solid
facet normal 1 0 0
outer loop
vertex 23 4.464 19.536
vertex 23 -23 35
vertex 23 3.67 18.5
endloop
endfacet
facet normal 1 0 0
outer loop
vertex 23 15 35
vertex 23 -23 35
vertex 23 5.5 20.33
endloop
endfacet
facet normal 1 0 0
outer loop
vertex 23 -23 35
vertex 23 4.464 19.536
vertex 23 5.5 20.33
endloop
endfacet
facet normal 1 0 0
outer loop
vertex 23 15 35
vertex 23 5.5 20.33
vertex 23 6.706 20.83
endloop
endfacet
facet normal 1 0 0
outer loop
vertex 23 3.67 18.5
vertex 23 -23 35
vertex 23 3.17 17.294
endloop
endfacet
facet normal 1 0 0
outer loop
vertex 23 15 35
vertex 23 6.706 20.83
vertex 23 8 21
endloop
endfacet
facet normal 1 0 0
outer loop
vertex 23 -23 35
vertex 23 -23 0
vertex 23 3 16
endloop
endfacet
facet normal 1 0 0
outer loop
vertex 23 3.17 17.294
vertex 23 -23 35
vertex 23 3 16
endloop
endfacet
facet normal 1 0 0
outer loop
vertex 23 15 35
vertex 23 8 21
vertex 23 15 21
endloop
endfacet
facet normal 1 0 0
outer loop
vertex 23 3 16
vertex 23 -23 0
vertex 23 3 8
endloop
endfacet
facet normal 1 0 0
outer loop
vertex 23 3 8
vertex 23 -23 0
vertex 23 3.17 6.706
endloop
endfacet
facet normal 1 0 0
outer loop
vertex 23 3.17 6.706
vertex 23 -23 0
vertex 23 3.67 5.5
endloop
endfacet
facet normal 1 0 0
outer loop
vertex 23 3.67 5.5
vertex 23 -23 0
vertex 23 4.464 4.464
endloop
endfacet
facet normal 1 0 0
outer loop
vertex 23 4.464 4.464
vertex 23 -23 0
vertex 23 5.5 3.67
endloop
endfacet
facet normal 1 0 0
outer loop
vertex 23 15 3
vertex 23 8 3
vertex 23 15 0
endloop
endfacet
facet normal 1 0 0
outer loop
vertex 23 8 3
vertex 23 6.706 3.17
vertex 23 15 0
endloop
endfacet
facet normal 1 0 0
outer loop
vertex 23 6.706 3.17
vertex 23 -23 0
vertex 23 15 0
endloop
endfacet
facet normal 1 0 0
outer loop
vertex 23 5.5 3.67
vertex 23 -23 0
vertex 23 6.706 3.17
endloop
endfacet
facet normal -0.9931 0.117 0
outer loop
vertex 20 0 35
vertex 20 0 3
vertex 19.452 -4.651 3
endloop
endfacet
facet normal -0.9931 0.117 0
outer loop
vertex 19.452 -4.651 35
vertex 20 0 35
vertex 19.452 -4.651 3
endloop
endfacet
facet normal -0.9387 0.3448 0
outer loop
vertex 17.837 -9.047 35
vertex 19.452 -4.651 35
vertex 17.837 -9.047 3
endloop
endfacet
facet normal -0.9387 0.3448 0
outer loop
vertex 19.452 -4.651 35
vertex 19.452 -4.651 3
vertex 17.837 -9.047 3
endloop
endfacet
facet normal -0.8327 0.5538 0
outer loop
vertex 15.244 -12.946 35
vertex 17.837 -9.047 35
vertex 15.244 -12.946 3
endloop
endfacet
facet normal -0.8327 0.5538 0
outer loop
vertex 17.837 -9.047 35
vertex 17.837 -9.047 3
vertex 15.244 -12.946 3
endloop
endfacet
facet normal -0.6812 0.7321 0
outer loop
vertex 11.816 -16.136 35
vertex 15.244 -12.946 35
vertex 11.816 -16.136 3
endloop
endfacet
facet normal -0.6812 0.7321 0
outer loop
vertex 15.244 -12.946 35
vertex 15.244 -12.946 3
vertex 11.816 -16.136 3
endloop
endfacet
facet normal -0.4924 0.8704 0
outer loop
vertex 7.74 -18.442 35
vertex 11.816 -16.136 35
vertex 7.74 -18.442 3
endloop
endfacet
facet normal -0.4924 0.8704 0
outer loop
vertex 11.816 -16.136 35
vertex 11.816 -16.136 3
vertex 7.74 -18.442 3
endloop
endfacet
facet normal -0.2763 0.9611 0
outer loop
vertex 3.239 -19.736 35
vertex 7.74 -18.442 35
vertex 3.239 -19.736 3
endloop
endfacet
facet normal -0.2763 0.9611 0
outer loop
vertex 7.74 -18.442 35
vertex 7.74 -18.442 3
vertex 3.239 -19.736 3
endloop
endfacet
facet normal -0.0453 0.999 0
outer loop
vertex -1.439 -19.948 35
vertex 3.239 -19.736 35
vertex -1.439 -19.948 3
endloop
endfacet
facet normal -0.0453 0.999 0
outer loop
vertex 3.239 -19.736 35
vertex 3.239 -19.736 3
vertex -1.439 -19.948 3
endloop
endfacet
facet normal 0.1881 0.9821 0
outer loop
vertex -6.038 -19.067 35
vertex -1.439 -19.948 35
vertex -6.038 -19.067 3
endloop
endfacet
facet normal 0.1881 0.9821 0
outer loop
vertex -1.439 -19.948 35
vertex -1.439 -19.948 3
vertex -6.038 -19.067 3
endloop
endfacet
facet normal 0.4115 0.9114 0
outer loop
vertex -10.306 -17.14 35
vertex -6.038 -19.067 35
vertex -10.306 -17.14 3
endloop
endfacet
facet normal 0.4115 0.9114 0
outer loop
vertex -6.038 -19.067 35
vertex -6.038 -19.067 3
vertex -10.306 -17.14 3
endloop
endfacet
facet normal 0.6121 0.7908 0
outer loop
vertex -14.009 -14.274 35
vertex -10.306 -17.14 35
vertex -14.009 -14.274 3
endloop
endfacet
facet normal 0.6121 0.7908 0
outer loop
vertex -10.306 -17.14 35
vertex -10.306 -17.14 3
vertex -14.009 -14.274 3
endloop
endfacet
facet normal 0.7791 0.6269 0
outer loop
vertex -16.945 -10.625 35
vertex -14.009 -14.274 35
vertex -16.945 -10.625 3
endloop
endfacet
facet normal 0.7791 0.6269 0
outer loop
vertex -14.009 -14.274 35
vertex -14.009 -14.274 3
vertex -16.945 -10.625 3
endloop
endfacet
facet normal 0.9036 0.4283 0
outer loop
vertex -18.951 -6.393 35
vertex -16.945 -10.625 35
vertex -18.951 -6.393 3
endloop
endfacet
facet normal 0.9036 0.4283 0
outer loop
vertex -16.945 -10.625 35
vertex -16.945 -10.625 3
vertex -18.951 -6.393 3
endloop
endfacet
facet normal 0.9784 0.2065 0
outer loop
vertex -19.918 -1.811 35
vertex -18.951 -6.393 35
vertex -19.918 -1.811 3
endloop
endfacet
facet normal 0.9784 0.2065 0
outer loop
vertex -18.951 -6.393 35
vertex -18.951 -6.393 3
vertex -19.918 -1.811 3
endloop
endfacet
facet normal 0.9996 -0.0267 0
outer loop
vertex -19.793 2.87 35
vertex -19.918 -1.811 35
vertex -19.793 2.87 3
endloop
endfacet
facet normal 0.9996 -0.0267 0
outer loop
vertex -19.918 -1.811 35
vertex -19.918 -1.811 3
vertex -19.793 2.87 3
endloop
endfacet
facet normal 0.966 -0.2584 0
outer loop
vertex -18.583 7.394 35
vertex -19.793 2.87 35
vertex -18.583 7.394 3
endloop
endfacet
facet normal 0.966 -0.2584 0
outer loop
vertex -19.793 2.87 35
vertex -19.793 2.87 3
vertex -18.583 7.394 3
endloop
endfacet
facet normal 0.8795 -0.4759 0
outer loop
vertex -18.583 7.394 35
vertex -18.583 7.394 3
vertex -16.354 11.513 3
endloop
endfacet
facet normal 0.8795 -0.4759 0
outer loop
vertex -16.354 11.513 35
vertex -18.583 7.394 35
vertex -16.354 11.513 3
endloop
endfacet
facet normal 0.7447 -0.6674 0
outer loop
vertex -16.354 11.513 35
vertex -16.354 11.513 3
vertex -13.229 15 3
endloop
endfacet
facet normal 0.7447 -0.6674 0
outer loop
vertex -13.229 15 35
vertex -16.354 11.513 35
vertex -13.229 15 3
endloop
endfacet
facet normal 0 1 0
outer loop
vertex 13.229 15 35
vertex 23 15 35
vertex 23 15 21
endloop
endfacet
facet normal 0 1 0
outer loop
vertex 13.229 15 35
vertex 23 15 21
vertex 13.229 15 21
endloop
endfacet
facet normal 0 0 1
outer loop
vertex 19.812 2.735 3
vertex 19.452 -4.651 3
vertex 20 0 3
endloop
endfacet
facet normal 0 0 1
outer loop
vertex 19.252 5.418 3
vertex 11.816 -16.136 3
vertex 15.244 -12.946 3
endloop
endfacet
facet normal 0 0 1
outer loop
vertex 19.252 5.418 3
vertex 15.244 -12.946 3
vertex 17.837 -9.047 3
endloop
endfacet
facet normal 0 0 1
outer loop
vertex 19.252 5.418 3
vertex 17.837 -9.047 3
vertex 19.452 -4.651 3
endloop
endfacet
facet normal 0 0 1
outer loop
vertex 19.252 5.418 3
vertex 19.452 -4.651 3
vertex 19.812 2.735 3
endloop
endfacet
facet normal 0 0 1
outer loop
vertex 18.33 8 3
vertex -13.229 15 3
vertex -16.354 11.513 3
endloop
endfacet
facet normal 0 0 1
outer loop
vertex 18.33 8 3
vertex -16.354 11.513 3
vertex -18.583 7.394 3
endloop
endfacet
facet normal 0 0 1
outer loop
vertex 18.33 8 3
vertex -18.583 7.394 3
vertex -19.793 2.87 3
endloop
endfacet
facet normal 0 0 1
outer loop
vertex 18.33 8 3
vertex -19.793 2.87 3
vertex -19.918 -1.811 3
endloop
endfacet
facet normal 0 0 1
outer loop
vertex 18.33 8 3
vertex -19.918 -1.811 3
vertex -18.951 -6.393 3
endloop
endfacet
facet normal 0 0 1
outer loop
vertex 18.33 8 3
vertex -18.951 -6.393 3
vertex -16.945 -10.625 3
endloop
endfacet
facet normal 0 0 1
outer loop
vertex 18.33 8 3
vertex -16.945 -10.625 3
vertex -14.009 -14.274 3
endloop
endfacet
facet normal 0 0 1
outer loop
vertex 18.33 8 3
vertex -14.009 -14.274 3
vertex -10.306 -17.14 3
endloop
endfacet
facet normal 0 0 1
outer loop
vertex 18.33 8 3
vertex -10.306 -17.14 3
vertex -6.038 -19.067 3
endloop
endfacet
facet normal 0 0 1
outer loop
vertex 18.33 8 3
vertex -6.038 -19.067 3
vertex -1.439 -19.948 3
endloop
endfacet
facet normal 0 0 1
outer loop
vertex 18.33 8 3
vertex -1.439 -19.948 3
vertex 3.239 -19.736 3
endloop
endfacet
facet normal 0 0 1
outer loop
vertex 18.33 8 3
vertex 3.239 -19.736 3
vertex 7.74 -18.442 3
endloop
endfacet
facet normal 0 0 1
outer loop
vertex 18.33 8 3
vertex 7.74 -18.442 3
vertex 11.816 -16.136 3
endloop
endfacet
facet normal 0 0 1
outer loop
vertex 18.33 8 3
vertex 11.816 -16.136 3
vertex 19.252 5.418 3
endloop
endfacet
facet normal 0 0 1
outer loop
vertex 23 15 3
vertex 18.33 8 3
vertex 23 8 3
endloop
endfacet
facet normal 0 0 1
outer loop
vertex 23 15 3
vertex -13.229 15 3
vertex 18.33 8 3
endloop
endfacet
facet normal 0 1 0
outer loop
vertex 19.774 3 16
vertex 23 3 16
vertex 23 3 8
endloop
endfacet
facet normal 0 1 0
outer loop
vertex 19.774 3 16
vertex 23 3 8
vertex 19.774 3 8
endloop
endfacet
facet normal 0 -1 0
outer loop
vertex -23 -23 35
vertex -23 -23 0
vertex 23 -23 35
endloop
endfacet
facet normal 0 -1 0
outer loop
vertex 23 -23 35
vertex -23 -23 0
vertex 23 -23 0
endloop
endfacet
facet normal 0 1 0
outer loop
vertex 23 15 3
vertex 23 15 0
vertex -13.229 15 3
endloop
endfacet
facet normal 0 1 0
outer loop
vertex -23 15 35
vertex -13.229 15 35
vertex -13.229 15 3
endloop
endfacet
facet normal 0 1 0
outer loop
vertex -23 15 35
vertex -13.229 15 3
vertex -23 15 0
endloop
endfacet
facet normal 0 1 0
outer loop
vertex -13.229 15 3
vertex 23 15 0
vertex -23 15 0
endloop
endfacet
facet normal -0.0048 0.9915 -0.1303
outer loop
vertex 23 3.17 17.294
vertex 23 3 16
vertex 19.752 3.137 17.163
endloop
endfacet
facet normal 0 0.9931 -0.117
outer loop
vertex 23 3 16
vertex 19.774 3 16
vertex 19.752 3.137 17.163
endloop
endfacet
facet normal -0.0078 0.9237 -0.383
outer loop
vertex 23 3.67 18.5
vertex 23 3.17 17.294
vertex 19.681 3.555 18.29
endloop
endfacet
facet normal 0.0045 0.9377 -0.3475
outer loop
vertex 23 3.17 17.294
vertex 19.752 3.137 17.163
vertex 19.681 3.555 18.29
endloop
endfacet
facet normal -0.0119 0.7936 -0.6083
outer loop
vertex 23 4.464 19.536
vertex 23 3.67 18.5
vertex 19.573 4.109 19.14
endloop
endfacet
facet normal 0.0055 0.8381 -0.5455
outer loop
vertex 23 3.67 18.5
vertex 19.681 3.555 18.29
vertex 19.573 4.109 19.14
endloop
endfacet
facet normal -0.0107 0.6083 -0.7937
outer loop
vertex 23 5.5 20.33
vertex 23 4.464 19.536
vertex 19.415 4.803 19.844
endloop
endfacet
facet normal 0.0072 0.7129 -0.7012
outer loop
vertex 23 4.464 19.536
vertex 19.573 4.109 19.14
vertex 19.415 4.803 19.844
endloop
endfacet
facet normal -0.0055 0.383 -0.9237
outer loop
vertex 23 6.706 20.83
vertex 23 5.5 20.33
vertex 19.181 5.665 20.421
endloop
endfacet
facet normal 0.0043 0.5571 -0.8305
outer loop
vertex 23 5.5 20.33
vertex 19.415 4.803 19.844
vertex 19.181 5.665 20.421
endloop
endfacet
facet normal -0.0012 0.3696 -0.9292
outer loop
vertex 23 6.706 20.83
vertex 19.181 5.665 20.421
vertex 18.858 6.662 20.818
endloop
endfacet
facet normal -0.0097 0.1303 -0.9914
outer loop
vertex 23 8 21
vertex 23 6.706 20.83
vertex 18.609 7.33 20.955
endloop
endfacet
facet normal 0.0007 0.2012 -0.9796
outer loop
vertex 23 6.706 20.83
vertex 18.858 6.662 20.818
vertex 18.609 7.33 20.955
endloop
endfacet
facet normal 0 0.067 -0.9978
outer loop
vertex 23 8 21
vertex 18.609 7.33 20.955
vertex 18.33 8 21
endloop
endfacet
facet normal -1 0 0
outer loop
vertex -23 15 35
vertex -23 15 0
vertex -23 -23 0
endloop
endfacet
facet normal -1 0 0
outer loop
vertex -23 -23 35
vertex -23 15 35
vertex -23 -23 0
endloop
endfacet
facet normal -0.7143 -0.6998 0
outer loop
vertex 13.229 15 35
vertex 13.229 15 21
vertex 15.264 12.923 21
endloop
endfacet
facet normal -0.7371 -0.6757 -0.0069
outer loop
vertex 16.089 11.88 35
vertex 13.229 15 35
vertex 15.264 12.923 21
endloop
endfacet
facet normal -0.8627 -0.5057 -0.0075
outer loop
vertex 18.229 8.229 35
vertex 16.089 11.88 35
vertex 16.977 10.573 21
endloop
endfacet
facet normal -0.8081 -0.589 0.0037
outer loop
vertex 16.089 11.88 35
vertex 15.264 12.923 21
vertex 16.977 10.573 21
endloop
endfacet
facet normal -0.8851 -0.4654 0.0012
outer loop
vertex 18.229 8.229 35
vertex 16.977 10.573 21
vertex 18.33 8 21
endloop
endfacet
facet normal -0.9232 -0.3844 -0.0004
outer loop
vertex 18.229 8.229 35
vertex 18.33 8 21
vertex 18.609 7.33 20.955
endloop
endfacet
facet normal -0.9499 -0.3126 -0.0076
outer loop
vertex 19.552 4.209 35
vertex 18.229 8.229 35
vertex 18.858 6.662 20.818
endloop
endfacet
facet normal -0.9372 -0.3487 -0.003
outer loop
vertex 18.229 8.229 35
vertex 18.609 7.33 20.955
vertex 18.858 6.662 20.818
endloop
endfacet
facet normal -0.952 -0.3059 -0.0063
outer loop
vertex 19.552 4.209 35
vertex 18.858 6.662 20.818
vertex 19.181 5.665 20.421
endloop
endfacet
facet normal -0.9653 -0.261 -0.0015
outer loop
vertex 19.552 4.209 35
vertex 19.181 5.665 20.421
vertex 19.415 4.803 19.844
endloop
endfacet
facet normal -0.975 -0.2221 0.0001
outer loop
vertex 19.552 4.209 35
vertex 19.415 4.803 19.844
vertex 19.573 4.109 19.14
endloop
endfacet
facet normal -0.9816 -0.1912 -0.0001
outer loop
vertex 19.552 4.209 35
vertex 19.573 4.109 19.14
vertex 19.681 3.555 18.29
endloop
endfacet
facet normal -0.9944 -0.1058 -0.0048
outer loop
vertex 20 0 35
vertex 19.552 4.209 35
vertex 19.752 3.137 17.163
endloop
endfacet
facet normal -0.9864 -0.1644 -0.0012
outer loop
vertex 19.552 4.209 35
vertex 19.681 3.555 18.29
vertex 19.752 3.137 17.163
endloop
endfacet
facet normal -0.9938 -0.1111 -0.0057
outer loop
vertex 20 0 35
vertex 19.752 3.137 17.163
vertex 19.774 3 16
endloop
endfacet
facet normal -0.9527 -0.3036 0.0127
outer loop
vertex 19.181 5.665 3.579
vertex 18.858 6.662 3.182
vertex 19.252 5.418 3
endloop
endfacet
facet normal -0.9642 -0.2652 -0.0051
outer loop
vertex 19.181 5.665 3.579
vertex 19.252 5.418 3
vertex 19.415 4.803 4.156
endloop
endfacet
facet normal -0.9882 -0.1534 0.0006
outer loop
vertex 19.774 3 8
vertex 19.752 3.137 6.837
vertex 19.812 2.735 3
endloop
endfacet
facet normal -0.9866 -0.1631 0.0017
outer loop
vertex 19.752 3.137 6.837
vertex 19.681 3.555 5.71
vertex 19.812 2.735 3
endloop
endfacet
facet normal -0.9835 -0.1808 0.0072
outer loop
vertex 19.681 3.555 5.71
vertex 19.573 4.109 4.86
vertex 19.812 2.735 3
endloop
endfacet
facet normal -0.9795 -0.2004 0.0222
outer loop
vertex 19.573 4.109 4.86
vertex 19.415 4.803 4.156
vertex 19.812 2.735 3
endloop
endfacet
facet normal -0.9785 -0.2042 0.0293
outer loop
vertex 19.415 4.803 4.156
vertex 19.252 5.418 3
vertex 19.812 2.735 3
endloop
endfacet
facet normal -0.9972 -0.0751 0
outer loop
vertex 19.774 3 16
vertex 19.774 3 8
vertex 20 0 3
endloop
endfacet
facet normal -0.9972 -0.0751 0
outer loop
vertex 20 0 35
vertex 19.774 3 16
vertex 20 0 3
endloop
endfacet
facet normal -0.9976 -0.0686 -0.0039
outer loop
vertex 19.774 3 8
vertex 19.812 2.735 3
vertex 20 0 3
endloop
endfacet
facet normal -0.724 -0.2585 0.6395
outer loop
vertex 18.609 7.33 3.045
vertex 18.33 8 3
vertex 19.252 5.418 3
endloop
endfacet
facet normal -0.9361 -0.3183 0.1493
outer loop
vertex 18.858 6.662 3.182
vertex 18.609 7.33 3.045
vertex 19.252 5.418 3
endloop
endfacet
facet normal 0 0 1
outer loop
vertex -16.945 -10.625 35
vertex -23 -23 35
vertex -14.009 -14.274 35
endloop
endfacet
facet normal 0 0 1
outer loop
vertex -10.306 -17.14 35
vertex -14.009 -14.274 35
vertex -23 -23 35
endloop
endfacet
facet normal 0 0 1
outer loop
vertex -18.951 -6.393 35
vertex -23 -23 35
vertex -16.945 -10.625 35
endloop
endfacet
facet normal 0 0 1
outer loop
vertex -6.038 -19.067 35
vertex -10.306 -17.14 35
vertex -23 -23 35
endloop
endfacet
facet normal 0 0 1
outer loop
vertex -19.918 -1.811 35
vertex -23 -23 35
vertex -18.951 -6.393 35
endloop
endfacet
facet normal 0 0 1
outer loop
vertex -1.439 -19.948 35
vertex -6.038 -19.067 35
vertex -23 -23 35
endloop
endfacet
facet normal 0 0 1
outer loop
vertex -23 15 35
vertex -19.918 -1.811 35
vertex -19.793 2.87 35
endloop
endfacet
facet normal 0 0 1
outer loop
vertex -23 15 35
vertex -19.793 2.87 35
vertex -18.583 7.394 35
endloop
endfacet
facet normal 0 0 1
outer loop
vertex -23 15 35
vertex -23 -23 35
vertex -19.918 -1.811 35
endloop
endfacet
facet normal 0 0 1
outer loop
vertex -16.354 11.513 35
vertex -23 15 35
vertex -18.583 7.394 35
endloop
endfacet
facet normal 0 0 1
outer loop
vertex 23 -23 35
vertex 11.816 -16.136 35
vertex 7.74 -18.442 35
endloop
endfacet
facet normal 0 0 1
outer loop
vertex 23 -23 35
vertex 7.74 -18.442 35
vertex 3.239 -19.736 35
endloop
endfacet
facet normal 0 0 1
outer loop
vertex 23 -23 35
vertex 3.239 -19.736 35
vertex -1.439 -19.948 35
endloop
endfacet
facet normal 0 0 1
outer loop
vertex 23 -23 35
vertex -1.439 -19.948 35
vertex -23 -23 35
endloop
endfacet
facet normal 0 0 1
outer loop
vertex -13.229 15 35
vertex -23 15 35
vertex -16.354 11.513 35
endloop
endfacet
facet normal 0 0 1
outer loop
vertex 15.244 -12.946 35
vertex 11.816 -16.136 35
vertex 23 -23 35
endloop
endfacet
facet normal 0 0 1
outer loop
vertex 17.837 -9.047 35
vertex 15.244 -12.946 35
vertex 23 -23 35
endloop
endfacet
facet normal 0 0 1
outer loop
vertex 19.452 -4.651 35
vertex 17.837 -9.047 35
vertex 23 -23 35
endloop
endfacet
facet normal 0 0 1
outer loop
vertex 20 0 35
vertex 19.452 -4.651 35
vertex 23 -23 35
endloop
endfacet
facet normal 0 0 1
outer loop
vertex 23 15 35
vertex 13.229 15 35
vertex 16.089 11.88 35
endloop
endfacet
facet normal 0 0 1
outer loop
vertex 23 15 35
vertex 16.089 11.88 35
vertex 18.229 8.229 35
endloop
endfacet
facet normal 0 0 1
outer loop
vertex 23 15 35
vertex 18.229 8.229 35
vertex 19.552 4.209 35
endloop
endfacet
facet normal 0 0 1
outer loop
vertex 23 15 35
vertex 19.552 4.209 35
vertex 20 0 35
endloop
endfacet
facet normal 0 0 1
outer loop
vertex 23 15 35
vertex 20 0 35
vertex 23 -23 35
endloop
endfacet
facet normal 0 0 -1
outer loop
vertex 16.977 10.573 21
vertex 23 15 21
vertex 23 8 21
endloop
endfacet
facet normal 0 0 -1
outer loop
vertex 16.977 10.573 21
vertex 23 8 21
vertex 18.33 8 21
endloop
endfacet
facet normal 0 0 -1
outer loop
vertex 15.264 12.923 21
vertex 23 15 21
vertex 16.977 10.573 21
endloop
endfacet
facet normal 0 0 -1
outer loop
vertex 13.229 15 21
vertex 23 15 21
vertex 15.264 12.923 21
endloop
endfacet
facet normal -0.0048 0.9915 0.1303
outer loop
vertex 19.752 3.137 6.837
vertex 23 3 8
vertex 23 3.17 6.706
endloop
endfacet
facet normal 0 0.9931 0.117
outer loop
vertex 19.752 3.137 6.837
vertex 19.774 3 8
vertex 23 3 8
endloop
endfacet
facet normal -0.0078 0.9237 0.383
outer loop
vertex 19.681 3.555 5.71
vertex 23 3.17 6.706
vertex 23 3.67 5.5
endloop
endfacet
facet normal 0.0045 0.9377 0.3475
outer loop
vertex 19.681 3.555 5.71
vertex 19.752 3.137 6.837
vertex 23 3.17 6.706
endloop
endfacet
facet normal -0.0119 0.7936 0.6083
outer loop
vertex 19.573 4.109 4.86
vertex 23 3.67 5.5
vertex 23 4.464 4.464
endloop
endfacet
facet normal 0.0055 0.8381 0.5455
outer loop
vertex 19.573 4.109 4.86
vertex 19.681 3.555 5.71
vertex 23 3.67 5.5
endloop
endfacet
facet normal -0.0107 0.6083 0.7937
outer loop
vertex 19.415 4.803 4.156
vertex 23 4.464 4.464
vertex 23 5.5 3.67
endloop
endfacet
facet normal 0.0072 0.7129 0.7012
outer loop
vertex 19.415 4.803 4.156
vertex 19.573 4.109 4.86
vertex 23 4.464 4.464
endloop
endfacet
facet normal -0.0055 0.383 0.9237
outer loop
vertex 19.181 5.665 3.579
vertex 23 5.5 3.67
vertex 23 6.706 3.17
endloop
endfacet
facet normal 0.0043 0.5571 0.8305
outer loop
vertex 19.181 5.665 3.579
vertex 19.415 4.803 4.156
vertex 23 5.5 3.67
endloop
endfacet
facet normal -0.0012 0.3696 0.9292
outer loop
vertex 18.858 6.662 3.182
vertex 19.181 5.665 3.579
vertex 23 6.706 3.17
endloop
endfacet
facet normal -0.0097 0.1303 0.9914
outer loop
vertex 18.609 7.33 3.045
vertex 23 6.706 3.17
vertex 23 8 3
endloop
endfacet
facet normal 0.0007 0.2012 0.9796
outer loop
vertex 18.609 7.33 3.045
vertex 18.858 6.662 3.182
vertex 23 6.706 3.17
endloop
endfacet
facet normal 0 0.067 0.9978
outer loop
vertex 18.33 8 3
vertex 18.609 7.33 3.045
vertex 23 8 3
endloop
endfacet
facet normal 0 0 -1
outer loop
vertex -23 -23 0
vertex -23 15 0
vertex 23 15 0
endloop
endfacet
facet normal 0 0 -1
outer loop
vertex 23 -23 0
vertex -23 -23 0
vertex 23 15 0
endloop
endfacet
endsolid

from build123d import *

# Parameters (mm, degrees)
F1_DEPTH = 35
F2_DEPTH = 3
F3_W     = 9.7712434447
F3_H     = 18
F4_DEPTH = 12
F5_R     = 5


with BuildPart() as f1:
    # F0 (on Top) → F1 (new body)
    with BuildSketch(Plane.XY):
        with BuildLine():
            Line((-13.2287565553, 15), (-23, 15))
            Line((-23, 15), (-23, -23))
            Line((-23, -23), (23, -23))
            Line((23, -23), (23, 15))
            Line((23, 15), (13.2287565553, 15))
            ThreePointArc((13.2287565553, 15), (18.2287565553, 8.2287565553), (20, 0))
            ThreePointArc((20, 0), (-8.2287565553, -18.2287565553), (-13.2287565553, 15))
        make_face()
    extrude(amount=F1_DEPTH)

    # F0 (on Top) → F2 (join)
    with BuildSketch(Plane.XY):
        with BuildLine():
            Line((13.2287565553, 15), (-13.2287565553, 15))
            ThreePointArc((-13.2287565553, 15), (-8.2287565553, -18.2287565553), (20, 0))
            ThreePointArc((20, 0), (18.2287565553, 8.2287565553), (13.2287565553, 15))
        make_face()
    extrude(amount=F2_DEPTH)

    # F3 (on face) → F4 (cut)
    with BuildSketch(Plane(origin=(0, 15, 0), x_dir=(-1, 0, 0), z_dir=(0, 1, 0))):
        with Locations((-18.1143782777, 12)):
            Rectangle(F3_W, F3_H)
    extrude(amount=-F4_DEPTH, mode=Mode.SUBTRACT)

    # F5
    f5_edges = [f1.edges().sort_by_distance(p)[0] for p in [
        (21.38686, 3, 21),
        (21.38686, 3, 3),
    ]]
    fillet(f5_edges, radius=F5_R)


solid = f1.part
